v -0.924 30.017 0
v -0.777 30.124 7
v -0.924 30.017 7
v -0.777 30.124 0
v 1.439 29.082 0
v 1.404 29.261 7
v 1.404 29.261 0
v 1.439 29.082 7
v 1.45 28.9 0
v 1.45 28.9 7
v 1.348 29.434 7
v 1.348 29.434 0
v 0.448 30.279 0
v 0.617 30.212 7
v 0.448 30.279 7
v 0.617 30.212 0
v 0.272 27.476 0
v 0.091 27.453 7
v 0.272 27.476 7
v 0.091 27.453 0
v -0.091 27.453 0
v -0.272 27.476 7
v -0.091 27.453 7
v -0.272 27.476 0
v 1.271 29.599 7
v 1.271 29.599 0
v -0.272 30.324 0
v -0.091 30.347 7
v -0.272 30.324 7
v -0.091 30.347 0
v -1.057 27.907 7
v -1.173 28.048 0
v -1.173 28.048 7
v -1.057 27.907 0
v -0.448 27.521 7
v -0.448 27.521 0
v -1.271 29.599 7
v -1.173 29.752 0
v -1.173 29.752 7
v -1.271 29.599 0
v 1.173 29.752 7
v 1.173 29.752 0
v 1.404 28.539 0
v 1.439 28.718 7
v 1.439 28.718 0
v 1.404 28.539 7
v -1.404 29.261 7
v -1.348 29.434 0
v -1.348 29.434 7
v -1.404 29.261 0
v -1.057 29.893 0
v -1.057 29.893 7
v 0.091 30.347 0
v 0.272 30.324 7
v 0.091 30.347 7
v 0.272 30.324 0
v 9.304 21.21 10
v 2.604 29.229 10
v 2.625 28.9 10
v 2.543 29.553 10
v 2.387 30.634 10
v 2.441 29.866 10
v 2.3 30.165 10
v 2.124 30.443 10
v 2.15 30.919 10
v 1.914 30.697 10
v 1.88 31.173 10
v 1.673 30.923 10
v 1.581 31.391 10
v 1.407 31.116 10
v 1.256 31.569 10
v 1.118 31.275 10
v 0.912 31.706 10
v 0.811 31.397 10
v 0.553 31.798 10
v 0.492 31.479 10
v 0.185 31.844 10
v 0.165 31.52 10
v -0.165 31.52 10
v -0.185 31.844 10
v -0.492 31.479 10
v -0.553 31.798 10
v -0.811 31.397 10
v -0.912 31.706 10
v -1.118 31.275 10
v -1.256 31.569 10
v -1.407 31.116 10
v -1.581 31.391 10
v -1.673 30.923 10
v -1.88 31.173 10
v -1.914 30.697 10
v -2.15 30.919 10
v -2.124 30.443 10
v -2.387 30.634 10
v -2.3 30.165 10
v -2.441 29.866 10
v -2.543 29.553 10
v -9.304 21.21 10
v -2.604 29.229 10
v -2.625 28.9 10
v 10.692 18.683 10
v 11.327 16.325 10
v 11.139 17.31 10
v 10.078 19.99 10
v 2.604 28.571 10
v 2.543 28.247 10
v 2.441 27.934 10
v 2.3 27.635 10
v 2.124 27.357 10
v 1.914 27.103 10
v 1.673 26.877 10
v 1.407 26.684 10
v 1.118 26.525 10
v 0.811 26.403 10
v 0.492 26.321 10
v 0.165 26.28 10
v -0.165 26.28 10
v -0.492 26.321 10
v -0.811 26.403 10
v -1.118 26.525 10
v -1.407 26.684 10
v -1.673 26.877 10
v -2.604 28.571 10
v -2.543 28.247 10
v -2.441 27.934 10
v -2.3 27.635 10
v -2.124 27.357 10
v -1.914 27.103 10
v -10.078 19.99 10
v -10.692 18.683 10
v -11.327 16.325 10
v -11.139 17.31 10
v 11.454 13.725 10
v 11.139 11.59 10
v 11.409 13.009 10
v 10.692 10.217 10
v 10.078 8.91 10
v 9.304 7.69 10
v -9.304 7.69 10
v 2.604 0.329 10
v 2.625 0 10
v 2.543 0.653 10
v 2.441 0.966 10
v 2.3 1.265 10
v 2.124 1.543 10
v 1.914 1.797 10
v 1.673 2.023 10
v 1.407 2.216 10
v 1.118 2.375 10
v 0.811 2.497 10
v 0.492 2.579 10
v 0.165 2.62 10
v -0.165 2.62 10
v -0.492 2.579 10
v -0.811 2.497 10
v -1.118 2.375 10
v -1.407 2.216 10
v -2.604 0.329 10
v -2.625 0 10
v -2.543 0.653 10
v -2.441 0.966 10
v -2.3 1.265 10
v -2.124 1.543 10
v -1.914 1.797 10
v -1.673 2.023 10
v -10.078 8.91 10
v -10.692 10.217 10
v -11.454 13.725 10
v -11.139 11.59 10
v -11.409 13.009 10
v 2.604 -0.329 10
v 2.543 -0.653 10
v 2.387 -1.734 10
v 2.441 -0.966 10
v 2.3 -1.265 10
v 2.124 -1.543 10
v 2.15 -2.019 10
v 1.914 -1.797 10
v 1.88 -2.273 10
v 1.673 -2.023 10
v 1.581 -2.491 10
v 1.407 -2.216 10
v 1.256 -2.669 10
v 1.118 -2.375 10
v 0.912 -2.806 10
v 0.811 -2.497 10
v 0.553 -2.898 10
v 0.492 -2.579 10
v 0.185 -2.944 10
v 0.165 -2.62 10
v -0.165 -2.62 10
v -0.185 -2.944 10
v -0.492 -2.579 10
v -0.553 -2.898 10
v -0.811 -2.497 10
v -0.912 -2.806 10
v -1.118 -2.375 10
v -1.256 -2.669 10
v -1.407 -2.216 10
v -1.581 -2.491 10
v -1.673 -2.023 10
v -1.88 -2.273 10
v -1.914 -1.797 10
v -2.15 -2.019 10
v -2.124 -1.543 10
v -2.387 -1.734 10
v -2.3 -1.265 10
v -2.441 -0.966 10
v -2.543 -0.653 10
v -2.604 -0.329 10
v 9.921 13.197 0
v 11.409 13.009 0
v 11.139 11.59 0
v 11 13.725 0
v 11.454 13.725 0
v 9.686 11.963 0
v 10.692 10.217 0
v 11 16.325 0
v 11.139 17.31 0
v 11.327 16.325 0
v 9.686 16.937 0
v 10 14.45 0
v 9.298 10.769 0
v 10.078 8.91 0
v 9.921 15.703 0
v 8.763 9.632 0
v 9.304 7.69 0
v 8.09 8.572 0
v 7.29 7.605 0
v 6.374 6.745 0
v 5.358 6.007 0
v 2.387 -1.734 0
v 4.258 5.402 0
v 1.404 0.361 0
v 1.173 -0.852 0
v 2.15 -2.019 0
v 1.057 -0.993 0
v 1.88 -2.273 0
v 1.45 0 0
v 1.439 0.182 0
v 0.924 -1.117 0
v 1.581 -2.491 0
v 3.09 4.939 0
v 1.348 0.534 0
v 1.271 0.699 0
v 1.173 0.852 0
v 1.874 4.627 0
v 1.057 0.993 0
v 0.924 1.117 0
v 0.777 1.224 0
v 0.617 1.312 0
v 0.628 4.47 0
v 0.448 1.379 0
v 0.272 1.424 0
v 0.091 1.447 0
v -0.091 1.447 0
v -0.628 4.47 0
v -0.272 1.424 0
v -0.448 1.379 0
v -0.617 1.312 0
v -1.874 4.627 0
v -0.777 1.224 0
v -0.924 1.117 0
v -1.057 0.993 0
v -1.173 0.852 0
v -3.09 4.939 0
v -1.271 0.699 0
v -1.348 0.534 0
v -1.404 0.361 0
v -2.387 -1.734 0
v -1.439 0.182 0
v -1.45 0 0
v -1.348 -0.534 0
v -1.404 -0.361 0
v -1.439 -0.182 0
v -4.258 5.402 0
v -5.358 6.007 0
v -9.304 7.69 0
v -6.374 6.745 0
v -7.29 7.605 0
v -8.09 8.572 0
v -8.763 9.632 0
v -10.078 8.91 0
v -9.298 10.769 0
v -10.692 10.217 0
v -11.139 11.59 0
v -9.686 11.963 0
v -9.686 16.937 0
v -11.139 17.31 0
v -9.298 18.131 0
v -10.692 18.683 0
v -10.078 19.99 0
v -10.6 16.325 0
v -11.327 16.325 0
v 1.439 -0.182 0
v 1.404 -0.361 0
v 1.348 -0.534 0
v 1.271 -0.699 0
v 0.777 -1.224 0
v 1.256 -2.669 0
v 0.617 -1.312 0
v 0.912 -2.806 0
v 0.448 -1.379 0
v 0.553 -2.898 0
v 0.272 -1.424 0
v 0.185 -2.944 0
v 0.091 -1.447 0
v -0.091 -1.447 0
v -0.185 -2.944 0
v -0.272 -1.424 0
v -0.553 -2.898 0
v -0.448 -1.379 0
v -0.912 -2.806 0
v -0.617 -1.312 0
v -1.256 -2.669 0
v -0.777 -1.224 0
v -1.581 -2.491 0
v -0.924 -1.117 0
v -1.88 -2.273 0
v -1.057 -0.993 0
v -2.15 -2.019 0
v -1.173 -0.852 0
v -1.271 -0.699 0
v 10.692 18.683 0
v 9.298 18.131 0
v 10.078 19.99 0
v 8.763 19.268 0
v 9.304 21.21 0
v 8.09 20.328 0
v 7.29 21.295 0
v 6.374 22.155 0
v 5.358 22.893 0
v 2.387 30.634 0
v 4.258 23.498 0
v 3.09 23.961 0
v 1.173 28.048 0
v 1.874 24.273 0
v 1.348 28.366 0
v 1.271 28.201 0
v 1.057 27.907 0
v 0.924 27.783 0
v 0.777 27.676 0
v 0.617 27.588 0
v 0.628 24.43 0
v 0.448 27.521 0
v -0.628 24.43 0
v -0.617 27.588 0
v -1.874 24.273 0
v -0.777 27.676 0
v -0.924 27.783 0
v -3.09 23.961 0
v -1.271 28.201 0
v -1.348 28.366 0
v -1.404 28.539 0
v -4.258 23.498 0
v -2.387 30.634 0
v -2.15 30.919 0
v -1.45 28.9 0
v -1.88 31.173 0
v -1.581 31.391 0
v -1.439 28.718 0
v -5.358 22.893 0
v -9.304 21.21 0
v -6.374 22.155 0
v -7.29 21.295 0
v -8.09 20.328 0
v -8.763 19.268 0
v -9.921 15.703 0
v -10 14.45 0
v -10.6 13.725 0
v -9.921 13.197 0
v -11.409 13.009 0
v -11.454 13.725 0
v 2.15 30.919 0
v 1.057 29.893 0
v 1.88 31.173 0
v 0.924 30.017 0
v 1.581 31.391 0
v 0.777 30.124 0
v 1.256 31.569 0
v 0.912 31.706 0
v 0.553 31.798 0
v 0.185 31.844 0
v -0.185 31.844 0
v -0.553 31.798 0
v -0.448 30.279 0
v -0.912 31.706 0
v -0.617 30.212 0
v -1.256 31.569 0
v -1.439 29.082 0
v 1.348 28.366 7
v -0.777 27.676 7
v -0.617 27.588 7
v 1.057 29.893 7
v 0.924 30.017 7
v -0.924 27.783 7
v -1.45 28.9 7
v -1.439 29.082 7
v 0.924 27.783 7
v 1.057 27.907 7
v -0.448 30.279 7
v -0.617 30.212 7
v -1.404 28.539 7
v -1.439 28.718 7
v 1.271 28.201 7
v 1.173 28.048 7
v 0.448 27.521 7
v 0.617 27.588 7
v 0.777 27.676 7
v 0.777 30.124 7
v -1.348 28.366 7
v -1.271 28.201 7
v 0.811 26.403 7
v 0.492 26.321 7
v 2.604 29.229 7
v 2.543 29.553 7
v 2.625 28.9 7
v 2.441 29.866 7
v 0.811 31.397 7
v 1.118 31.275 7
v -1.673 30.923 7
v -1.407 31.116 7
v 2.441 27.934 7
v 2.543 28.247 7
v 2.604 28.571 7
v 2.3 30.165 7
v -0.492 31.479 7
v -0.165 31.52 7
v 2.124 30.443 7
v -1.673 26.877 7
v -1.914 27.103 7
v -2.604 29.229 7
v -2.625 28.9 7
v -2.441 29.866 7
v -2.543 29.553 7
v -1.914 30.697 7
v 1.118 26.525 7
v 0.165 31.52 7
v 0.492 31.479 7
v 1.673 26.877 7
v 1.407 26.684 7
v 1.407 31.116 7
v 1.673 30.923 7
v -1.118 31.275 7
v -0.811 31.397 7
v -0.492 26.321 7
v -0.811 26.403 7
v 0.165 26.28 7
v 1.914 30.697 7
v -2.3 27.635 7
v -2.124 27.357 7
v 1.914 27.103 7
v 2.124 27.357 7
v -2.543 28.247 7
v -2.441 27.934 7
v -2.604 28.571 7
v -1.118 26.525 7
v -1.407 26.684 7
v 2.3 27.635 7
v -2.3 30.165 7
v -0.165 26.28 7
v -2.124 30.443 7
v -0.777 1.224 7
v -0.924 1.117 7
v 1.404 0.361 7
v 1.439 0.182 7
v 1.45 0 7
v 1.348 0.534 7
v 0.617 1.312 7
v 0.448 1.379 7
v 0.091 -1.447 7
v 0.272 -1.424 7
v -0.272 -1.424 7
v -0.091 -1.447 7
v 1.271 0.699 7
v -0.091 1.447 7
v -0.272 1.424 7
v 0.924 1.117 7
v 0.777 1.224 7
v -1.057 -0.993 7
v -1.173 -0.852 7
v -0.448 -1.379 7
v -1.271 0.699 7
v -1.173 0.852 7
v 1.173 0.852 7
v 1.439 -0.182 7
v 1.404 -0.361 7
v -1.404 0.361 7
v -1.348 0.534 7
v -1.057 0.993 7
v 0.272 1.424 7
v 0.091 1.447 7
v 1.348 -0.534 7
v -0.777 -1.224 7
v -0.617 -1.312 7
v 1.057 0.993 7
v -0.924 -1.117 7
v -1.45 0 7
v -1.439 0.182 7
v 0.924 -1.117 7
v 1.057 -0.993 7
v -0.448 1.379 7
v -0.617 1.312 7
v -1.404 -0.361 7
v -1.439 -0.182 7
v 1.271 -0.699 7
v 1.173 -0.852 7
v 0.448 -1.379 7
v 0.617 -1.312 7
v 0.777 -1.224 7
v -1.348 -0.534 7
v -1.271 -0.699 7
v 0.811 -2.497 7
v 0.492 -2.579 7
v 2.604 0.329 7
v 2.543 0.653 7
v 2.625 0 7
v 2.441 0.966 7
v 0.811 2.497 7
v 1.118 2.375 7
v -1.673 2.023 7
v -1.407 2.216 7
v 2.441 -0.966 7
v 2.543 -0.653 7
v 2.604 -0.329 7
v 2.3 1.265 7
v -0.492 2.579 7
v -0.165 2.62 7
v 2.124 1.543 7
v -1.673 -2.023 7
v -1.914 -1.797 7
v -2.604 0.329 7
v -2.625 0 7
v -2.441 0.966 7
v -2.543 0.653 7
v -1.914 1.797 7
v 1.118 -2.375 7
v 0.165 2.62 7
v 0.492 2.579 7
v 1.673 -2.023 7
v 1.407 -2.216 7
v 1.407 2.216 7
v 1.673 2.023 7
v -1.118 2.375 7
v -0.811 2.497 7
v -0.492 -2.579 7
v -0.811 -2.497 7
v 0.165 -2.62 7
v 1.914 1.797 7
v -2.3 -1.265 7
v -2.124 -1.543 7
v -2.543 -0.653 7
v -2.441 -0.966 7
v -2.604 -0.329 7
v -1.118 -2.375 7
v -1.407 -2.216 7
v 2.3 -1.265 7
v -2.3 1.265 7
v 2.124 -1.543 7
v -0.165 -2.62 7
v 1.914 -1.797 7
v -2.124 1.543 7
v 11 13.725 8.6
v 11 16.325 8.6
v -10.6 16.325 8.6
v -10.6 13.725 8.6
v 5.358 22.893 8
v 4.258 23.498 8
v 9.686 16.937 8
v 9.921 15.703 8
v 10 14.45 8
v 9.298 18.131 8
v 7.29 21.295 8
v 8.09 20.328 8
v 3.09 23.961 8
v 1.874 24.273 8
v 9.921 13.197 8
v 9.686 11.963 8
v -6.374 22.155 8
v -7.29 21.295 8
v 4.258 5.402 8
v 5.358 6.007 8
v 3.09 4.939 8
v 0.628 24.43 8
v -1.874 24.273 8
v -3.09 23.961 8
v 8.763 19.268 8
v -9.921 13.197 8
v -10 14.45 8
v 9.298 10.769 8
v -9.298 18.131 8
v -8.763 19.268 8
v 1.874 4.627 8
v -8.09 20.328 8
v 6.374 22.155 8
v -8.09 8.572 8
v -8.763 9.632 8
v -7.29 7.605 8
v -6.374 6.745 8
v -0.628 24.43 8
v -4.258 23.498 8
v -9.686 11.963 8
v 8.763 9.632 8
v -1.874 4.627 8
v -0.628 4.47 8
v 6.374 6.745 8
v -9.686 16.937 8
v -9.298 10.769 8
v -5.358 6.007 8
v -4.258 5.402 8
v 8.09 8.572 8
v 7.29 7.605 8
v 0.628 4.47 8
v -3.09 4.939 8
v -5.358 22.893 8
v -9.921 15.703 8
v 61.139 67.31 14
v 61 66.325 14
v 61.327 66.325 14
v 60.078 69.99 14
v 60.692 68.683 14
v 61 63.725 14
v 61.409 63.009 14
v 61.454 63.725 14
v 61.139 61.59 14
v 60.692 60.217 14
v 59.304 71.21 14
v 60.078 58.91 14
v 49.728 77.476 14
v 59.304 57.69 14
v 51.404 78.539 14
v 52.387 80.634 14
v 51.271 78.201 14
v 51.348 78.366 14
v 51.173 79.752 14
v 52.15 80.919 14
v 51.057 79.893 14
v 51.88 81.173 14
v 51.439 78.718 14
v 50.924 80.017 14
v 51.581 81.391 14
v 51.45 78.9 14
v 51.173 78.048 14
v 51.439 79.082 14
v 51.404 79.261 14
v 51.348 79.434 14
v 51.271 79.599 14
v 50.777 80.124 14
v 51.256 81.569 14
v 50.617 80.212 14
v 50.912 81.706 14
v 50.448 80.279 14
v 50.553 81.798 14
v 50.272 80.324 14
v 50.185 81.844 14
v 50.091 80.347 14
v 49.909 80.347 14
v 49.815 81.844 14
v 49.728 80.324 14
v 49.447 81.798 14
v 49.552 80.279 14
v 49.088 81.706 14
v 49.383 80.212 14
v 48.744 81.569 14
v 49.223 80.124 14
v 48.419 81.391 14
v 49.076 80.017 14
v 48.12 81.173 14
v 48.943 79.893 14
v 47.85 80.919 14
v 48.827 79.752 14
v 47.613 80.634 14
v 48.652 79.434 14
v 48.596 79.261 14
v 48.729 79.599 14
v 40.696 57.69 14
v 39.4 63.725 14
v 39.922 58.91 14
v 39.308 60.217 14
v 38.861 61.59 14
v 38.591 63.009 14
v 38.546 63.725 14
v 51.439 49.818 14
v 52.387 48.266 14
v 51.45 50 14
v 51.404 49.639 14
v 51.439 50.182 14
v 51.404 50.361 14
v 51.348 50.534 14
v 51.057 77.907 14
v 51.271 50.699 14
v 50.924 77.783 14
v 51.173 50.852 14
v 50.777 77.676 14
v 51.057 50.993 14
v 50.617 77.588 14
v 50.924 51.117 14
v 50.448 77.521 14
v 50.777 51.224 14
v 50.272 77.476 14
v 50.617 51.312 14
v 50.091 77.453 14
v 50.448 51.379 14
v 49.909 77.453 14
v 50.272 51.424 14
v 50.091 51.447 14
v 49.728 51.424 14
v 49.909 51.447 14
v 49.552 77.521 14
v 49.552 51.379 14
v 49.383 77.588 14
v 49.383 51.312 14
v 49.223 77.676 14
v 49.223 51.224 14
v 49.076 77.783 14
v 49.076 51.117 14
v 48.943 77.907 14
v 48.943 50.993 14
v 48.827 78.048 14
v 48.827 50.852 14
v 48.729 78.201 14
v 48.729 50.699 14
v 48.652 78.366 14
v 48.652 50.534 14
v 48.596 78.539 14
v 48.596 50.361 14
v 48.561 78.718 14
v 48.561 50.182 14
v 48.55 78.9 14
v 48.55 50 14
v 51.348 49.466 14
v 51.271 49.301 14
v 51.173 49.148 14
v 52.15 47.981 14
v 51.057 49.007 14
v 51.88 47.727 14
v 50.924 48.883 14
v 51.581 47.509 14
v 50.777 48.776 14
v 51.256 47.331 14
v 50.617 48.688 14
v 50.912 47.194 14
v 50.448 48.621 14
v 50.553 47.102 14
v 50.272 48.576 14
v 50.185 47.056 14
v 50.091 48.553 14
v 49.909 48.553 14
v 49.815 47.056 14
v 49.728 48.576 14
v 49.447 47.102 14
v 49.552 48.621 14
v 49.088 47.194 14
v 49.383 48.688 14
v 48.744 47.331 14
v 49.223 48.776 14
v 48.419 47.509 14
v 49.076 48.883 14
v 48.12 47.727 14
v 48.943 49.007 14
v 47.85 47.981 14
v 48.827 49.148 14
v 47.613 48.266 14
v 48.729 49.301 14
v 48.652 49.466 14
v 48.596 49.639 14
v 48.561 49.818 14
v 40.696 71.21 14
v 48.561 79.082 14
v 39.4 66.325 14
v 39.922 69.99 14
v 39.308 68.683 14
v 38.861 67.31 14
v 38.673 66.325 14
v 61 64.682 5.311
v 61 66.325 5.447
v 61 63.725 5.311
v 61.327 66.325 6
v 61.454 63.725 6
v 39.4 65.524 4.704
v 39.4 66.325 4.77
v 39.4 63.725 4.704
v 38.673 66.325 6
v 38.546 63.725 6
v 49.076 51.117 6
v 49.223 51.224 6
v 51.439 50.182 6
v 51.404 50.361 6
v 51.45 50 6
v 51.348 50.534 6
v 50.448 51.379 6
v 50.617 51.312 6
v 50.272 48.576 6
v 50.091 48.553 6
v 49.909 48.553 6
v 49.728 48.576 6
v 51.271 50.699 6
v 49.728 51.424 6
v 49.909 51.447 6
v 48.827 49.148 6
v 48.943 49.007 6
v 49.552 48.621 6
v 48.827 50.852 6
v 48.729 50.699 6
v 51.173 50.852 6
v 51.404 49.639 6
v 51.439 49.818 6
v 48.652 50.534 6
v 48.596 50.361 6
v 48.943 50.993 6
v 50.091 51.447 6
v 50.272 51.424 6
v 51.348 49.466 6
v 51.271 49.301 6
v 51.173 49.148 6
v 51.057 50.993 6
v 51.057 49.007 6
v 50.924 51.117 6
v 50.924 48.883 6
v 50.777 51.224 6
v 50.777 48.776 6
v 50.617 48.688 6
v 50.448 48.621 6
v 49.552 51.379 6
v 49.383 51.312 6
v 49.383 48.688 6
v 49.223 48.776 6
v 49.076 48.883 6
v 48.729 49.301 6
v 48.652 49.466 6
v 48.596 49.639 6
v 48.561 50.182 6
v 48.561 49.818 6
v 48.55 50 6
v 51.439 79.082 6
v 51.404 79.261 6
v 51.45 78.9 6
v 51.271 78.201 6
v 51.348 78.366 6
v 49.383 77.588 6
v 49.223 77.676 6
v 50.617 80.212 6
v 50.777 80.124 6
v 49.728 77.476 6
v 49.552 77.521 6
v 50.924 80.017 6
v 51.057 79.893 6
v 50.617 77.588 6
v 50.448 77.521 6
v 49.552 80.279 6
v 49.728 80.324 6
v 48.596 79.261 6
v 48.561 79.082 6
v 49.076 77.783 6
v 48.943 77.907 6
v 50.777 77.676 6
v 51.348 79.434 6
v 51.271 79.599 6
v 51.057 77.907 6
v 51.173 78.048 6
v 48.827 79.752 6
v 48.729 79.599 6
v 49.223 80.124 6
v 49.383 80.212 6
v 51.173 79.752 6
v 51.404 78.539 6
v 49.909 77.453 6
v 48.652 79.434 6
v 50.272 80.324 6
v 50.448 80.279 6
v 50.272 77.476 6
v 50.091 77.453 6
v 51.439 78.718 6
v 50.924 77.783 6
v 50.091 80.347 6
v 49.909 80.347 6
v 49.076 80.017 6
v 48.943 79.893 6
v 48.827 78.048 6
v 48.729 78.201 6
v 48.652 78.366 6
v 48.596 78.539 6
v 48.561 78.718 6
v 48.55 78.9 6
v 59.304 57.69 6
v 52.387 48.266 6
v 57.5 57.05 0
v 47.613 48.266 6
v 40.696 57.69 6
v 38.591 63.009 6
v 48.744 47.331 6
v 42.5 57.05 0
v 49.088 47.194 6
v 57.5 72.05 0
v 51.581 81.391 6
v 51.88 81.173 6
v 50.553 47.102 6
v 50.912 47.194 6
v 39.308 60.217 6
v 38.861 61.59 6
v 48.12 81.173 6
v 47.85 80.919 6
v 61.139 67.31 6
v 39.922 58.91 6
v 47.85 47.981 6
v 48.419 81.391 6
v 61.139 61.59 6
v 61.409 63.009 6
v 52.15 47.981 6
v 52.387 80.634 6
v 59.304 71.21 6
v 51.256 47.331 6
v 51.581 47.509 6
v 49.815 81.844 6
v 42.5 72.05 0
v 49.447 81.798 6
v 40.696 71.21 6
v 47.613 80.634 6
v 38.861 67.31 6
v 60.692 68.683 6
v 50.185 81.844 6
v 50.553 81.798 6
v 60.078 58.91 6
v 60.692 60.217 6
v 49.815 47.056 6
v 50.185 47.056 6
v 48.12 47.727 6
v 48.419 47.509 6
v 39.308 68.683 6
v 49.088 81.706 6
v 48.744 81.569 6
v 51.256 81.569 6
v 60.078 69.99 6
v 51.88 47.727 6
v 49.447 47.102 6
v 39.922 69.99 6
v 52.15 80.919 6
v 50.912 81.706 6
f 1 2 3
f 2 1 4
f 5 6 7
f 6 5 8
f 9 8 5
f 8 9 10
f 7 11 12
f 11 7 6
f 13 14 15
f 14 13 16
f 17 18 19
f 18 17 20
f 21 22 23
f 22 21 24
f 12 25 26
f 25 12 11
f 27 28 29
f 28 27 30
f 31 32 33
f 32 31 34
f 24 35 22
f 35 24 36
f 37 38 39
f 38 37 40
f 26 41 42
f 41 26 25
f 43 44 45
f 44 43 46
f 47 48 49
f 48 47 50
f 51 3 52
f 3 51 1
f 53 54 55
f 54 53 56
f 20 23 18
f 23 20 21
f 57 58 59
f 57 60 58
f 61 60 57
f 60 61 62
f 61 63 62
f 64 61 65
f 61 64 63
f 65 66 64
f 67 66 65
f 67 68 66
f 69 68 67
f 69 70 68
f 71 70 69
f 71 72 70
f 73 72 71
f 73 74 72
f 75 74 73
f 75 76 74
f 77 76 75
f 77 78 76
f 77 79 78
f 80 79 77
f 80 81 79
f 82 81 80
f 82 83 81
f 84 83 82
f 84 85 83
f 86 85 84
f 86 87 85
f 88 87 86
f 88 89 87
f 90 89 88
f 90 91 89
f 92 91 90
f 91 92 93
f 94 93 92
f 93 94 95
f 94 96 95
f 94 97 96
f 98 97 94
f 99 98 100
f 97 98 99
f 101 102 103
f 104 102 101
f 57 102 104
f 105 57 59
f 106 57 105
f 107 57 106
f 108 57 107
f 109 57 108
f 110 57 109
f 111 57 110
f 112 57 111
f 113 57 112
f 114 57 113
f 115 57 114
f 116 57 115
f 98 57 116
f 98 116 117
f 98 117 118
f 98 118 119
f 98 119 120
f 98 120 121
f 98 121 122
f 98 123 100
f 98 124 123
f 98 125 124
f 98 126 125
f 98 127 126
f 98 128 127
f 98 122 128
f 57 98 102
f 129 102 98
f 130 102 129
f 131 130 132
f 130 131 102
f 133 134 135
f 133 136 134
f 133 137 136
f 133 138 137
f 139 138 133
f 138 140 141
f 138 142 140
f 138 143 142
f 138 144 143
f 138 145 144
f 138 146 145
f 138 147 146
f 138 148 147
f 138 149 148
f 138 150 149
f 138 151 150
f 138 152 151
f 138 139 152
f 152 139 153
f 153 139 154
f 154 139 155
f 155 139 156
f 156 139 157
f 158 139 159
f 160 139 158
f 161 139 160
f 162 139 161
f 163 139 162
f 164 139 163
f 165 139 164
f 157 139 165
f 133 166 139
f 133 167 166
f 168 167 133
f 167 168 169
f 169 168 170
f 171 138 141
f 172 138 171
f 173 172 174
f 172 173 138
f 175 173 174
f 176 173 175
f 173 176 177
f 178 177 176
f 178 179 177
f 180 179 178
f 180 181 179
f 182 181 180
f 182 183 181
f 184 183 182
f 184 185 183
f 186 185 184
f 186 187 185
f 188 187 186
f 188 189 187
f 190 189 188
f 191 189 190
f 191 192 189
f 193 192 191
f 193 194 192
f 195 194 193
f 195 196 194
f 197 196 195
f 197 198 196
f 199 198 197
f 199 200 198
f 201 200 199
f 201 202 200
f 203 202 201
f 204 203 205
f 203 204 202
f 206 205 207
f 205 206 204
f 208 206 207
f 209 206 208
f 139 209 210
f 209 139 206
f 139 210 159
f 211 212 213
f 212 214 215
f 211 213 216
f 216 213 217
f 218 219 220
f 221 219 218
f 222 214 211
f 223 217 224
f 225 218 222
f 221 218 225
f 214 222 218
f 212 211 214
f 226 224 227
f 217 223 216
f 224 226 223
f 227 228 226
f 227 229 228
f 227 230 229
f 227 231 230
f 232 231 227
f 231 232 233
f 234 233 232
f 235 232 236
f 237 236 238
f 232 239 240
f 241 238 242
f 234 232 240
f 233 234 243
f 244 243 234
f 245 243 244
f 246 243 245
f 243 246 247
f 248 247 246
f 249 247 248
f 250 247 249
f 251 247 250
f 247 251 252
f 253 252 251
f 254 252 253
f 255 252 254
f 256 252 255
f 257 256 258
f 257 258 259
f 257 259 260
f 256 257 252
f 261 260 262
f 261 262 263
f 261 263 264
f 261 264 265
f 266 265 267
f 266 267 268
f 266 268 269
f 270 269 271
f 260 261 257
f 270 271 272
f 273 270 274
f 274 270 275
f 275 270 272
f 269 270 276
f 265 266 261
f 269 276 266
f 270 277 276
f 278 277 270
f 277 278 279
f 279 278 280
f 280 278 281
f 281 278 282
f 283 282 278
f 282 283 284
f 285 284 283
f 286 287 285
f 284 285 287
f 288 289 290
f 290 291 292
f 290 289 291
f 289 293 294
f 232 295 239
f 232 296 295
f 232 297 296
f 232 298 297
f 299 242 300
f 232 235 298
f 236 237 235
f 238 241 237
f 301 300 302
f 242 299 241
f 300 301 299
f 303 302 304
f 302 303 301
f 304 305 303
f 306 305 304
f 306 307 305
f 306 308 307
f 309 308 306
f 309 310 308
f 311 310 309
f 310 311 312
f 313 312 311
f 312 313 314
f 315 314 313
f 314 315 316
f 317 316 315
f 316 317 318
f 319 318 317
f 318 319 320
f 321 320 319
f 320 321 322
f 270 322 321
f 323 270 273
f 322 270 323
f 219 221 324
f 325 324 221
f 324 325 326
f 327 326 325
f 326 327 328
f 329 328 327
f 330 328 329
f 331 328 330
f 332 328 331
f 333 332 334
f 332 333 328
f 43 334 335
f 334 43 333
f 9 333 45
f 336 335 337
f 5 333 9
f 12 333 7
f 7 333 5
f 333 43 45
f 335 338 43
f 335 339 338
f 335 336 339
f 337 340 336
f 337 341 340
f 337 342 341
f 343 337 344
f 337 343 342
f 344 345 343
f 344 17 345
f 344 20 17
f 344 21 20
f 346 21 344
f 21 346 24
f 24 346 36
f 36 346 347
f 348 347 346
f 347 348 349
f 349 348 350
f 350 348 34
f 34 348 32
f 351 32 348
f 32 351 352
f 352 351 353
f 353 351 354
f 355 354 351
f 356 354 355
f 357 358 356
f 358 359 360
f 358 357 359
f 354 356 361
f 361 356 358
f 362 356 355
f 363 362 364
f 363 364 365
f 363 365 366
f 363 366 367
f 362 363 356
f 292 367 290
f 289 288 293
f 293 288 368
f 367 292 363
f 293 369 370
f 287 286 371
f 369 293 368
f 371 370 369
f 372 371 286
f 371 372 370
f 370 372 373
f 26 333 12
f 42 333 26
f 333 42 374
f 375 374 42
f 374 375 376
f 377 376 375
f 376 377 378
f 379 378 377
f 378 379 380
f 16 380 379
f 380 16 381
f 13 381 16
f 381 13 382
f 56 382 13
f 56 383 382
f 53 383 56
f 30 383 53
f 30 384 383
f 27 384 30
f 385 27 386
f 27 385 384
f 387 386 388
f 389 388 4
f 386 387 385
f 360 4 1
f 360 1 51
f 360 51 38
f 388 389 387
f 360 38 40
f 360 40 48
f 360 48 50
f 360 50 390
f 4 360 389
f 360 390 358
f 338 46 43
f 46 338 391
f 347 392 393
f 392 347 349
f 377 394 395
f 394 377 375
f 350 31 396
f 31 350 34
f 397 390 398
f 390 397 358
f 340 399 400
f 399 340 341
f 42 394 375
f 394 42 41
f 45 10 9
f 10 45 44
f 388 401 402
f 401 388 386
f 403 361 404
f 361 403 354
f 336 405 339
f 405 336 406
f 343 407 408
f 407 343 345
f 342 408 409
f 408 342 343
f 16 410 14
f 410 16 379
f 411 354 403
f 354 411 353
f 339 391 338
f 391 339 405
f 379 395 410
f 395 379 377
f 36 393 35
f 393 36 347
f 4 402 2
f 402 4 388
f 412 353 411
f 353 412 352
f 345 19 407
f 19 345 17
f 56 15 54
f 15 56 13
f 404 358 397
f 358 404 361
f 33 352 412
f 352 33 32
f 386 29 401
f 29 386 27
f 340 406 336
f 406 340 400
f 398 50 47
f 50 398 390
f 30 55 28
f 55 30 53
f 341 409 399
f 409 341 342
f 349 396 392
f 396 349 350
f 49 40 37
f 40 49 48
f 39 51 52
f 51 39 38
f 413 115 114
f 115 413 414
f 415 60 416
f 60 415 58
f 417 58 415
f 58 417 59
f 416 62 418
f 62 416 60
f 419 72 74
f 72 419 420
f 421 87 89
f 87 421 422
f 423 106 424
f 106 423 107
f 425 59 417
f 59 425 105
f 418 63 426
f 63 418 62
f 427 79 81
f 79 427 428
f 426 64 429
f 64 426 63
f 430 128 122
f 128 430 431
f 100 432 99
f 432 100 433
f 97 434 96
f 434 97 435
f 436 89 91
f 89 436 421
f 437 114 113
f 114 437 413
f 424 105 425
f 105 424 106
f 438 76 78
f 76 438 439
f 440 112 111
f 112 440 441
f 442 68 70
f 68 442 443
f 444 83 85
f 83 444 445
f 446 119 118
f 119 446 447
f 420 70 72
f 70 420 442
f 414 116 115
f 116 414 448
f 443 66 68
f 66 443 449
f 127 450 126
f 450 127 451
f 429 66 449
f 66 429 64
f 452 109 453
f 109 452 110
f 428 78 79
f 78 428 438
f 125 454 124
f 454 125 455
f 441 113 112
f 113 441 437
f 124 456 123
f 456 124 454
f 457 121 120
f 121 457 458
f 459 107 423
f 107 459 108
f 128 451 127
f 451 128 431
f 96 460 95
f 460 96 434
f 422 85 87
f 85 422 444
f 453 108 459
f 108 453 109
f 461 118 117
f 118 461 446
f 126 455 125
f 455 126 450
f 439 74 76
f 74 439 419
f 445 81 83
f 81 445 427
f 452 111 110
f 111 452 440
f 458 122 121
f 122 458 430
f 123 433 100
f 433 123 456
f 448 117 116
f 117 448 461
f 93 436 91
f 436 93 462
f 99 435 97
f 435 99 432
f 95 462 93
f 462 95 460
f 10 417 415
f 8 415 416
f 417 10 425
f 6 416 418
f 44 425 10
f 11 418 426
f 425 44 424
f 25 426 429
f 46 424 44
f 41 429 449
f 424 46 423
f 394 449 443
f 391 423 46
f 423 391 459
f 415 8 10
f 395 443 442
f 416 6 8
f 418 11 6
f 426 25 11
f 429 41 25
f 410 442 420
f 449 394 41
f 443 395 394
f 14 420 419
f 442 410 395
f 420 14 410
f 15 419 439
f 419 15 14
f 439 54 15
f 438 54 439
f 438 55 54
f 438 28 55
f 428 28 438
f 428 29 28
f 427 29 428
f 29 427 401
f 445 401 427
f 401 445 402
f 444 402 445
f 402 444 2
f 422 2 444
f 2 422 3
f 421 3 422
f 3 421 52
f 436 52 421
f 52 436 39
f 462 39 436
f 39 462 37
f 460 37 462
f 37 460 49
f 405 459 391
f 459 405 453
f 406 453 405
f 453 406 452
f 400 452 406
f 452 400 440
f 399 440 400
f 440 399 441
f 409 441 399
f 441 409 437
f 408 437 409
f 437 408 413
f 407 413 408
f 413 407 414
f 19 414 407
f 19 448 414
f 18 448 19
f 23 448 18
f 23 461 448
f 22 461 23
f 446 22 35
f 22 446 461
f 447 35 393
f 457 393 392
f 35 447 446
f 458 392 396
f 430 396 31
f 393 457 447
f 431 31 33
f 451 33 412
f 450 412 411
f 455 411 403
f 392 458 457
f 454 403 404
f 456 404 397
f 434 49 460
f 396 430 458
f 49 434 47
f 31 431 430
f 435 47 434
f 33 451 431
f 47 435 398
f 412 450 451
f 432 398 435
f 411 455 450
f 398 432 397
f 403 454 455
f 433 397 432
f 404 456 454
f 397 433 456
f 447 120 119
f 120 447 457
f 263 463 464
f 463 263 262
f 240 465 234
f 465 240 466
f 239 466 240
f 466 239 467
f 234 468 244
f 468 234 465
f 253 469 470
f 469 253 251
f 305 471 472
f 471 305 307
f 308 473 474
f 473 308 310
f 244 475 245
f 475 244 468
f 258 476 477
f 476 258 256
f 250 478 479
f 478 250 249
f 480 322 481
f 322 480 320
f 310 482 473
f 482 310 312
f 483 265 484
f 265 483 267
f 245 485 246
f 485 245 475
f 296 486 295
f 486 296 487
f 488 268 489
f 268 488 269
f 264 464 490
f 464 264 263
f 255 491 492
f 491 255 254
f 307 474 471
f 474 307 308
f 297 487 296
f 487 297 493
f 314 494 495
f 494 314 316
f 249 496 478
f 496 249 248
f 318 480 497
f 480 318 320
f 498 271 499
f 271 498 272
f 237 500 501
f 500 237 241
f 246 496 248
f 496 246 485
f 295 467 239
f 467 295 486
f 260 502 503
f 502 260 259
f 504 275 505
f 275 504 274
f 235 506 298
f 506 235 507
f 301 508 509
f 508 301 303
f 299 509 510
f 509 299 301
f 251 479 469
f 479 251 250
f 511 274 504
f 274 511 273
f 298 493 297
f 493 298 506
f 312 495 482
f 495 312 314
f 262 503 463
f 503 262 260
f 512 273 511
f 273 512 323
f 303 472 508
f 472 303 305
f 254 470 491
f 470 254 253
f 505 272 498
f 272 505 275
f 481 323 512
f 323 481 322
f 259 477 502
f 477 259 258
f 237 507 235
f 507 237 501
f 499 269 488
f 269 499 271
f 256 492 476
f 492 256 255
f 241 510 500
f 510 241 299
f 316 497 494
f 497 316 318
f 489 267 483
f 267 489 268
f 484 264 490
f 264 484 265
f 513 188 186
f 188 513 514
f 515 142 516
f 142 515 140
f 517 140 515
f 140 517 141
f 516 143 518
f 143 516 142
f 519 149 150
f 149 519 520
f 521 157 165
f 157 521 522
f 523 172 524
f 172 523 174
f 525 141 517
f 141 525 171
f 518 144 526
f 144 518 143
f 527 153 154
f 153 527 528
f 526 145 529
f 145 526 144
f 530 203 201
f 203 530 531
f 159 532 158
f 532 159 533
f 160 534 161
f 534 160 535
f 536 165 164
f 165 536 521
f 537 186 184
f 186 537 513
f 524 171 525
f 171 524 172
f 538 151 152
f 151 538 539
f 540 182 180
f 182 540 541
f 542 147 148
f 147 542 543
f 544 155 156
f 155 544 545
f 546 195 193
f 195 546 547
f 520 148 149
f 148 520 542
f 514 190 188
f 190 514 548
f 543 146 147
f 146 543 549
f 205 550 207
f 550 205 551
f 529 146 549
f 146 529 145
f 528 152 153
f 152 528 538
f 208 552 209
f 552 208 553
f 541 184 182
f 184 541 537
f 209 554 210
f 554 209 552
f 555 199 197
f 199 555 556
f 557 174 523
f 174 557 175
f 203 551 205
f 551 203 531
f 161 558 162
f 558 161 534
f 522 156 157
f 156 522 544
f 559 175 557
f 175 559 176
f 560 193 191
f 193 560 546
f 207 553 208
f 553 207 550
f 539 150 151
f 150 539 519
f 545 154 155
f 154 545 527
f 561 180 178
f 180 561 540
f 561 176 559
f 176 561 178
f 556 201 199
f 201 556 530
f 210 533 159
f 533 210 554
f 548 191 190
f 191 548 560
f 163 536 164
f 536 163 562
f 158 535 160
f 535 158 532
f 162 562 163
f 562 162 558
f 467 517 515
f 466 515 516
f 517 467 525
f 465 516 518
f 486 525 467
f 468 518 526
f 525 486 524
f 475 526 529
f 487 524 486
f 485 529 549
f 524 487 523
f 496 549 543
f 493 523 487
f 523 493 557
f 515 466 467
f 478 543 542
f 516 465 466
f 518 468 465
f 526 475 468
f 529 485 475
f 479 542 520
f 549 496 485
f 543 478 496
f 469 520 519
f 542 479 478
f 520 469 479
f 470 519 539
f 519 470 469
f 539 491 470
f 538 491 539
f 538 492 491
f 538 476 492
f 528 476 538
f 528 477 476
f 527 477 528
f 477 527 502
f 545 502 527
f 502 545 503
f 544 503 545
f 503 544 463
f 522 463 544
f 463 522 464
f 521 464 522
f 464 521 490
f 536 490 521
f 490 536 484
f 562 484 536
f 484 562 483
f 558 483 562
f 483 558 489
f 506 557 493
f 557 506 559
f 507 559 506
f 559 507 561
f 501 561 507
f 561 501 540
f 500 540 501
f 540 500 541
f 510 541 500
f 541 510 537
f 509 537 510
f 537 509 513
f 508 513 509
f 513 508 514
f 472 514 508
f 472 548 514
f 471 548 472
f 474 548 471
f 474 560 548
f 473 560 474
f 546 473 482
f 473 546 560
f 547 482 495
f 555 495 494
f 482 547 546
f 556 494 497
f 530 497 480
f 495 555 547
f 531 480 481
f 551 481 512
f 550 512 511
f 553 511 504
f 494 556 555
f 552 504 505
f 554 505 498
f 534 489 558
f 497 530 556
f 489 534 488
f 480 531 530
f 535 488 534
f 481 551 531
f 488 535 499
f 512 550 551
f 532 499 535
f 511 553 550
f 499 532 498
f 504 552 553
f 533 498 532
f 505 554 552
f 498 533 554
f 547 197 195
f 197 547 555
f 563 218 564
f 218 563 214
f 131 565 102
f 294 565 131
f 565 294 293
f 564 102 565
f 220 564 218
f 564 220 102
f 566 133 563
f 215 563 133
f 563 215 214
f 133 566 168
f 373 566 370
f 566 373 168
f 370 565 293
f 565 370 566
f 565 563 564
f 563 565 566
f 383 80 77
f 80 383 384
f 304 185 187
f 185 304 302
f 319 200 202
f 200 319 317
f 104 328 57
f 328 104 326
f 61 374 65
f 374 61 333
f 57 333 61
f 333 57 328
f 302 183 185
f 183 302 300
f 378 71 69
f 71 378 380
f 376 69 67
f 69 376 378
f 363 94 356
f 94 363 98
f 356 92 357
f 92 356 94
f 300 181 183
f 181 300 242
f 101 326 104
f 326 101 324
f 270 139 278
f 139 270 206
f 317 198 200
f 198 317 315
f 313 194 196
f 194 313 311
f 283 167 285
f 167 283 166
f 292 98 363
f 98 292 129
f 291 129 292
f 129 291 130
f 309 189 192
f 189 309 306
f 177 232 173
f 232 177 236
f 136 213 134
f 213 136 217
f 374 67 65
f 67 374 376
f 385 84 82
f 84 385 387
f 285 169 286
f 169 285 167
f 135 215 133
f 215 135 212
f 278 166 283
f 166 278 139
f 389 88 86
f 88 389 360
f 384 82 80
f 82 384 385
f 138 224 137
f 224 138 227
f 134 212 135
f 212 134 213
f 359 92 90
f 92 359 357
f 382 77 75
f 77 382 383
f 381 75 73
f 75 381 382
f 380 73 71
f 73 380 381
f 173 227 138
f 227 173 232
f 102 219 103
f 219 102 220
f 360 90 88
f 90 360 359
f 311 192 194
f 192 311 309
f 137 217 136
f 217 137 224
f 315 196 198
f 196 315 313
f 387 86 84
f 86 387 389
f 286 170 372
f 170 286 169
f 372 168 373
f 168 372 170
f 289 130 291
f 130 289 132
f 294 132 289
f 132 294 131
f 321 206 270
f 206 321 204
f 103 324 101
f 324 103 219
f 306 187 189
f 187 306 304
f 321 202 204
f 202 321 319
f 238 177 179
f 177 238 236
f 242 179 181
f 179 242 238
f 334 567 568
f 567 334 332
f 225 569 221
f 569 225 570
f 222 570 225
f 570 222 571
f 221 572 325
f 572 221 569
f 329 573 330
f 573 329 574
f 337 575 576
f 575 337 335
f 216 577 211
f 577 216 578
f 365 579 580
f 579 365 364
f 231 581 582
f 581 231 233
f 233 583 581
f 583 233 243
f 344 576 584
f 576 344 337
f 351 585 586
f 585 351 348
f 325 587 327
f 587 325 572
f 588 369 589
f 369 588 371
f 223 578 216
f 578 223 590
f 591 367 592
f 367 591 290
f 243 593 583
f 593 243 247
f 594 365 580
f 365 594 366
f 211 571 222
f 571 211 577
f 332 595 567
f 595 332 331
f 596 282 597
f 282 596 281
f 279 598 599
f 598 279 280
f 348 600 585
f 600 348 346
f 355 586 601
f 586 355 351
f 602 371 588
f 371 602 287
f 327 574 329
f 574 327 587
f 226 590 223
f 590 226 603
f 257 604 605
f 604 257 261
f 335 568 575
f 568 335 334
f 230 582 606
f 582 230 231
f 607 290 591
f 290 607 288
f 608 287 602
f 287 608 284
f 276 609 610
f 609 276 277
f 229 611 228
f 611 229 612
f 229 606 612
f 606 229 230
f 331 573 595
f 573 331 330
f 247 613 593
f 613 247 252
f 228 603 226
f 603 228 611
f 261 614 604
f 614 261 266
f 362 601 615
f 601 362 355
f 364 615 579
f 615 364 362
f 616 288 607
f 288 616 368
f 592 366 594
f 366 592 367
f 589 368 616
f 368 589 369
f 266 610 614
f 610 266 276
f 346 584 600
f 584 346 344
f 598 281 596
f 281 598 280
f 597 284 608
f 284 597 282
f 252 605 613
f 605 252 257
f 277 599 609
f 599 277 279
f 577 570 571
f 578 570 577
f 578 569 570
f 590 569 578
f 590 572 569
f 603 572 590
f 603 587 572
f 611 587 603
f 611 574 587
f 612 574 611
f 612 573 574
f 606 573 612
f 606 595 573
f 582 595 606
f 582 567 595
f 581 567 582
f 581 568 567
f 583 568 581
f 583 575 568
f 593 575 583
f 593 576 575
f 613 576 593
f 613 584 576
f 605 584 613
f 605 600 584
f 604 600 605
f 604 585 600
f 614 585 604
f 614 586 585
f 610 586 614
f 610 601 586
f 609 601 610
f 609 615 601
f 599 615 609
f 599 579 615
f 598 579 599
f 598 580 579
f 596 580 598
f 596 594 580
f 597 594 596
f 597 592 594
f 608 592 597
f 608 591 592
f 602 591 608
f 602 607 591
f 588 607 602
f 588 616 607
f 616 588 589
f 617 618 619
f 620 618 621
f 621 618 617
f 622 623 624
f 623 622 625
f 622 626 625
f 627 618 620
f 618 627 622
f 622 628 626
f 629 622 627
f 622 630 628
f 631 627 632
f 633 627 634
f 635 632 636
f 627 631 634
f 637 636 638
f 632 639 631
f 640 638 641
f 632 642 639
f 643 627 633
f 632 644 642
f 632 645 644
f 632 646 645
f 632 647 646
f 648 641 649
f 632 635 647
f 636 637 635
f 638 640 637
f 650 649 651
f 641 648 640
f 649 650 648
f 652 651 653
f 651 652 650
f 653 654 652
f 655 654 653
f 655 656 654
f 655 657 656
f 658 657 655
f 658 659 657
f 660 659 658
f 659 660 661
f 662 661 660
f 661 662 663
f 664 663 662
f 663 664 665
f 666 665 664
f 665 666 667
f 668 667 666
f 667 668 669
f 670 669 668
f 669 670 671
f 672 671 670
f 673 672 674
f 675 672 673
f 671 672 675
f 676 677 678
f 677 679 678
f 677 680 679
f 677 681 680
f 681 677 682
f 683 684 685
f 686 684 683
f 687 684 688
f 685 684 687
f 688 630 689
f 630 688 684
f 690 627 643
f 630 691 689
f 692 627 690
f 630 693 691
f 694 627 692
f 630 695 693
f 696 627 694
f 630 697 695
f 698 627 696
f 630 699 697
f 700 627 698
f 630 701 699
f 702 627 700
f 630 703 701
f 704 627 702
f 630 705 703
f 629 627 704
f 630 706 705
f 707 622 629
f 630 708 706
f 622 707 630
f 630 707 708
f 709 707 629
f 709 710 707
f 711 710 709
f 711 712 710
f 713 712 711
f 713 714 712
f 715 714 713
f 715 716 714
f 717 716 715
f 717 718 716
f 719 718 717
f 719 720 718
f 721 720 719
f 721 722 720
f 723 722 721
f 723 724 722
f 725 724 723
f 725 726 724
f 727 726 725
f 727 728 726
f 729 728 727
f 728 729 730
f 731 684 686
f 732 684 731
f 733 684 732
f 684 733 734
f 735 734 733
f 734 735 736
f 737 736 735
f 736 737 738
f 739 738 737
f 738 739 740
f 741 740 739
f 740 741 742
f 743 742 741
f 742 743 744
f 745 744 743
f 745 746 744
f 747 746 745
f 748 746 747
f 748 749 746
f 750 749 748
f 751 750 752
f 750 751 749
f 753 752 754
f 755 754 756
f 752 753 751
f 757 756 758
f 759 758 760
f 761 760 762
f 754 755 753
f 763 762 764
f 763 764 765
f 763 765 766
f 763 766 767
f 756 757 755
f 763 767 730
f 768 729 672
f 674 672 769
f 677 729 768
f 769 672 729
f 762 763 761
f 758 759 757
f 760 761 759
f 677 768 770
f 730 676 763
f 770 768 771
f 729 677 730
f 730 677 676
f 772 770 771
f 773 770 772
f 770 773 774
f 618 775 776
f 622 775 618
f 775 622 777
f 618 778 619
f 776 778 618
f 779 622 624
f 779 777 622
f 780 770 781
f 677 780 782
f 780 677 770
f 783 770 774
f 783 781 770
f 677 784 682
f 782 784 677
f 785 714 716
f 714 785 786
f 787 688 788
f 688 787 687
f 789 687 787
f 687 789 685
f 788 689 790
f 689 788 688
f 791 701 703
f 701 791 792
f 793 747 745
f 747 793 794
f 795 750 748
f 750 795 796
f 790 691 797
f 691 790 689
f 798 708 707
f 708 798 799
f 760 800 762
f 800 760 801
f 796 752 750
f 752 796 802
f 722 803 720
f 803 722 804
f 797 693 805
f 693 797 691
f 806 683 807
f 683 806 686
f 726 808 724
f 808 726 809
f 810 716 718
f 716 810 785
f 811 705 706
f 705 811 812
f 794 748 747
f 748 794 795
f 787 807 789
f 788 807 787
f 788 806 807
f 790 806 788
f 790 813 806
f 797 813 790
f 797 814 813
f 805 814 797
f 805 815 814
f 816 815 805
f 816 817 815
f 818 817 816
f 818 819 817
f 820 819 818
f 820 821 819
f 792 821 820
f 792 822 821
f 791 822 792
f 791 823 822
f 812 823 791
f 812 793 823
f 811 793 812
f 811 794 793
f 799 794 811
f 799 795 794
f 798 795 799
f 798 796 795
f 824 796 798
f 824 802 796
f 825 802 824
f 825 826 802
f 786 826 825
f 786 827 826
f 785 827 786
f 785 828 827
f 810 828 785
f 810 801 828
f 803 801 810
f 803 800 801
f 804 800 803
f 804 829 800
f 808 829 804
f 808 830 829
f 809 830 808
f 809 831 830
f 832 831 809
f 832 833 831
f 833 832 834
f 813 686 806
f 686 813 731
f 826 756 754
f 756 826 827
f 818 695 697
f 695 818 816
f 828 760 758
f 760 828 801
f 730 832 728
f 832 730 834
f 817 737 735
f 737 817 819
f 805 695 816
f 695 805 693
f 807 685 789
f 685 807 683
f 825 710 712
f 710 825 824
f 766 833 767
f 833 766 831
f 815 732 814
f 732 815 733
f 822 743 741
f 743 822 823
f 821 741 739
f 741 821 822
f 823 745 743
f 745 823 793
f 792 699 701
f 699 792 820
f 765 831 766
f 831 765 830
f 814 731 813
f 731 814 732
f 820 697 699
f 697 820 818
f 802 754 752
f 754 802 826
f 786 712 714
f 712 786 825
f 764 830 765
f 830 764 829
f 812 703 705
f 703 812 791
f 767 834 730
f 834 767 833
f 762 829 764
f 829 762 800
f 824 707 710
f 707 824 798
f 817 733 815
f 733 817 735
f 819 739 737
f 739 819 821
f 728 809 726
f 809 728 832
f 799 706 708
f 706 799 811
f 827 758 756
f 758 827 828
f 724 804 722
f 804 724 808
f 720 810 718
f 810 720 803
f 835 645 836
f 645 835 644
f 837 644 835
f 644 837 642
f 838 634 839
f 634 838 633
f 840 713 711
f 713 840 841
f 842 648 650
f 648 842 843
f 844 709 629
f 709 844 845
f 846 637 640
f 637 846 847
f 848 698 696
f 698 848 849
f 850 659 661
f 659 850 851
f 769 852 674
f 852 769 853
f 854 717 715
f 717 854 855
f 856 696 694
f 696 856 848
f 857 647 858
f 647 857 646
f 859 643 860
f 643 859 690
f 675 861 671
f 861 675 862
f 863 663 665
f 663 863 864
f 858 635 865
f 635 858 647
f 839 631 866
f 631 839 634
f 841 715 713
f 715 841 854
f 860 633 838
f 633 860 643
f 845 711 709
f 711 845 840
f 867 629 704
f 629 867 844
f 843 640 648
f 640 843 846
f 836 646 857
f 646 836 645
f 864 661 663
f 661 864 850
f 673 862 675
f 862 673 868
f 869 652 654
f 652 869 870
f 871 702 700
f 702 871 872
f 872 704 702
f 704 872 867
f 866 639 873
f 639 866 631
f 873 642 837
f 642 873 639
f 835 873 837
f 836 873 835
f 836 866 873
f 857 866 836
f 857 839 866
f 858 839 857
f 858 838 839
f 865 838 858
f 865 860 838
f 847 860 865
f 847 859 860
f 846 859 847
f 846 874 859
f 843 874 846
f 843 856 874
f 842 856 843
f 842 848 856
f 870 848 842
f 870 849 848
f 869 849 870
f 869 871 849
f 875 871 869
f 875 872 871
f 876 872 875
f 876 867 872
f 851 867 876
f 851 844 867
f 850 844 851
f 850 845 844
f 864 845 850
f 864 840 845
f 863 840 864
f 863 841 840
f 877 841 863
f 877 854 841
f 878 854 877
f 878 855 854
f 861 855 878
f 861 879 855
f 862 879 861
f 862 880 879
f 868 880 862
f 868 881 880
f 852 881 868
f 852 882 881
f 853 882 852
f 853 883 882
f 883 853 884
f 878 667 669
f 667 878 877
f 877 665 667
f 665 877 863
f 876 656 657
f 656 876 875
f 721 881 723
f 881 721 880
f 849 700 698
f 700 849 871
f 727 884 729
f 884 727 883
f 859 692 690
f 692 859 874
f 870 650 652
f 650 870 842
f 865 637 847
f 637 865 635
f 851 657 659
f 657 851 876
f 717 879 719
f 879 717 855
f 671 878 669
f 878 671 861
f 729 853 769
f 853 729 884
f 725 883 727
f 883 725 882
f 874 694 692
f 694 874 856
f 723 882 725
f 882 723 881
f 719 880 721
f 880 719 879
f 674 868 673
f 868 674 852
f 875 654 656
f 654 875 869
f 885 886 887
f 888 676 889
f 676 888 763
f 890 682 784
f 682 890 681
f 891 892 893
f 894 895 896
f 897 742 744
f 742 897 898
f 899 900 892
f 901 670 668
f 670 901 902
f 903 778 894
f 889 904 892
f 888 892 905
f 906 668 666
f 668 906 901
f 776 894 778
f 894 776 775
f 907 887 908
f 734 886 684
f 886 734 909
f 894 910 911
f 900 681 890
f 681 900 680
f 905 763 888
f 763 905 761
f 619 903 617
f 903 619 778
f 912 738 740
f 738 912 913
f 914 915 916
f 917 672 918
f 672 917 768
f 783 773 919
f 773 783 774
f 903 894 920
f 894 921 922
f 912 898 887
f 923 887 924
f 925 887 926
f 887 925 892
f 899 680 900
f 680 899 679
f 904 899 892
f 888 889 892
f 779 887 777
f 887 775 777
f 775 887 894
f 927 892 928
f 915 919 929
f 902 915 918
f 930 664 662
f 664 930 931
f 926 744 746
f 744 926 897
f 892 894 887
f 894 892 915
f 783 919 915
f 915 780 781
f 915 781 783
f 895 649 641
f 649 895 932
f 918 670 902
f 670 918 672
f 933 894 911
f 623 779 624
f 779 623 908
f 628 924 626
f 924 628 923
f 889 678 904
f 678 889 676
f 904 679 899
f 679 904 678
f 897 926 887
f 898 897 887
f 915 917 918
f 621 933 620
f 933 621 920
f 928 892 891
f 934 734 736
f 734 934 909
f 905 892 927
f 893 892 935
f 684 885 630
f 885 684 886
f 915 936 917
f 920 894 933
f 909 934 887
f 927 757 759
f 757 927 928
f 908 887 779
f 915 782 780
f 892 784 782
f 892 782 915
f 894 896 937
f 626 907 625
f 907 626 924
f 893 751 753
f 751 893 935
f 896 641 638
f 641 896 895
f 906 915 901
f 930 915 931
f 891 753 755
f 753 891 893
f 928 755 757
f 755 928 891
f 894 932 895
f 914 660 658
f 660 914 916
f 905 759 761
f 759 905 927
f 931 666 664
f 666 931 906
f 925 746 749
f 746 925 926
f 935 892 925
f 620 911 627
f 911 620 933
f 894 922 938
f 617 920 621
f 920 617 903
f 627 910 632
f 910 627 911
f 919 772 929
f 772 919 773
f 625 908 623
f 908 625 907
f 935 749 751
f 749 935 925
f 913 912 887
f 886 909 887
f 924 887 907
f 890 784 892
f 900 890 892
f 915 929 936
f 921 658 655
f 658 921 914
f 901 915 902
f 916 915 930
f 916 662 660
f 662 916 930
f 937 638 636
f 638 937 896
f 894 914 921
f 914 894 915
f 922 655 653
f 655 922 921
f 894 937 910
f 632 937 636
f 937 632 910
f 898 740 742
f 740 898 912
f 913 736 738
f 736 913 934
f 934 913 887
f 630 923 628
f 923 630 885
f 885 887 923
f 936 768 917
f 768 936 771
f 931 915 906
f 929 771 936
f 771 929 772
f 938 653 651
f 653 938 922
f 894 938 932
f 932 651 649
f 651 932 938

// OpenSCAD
$fn=50;


magnet_height=8;

screw_diameter=2.9;
magnet_diameter=20;
wall_thickness=3;
screw_head_height=3;
screw_head_diameter=5.25;
ziptie_width=2.6;
ziptie_depth=1.4;


screw_head_radius=screw_head_diameter/2;
magnet_radius=magnet_diameter/2;
screw_radius=screw_diameter/2;




module ziptie_side_cutout(top_height, top_cutout=false){
  translate([magnet_radius+wall_thickness-2,magnet_radius+screw_radius/2+wall_thickness,0]){
    cube([ziptie_depth,ziptie_width,top_height]);
    translate([(magnet_diameter+wall_thickness)*-1,0,0])
      cube([ziptie_depth,ziptie_width,top_height]);
    if (top_cutout)
      translate([(magnet_diameter+wall_thickness)*-1,0,top_height-ziptie_depth])
        cube([magnet_diameter+wall_thickness,ziptie_width,top_height]);
  }
}

module screw_cutout(top_height, with_screwheads=false){
    cylinder(h=top_height, r=screw_radius);
    if (with_screwheads)
      translate([0,0,top_height-screw_head_height])
        cylinder(h=screw_head_height, r=screw_head_radius);
    translate([0,magnet_diameter+screw_diameter+wall_thickness*2,0]){
      cylinder(h=top_height, r=screw_radius);
      if (with_screwheads)
        translate([0,0,top_height-screw_head_height])
          cylinder(h=screw_head_height, r=screw_head_radius);
    }
}

module cover_plate(with_magnet=true, with_screwheads=true, with_ziptie=true, top_height=10){
  difference(){
    hull(){
      cylinder(h=top_height, r=screw_radius+wall_thickness/2);
      translate([0,magnet_radius+screw_radius+wall_thickness,0])
        cylinder(h=top_height, r=magnet_radius+wall_thickness/2);
      translate([0,magnet_diameter+screw_diameter+wall_thickness*2,0]){
        cylinder(h=top_height, r=screw_radius+wall_thickness/2);
      }
    }
    screw_cutout(top_height, with_screwheads);
    if (with_magnet)
      translate([0,magnet_radius+screw_radius+wall_thickness,0])
        cylinder(h=magnet_height, r=magnet_radius);
    if (with_ziptie){
      ziptie_side_cutout(top_height, true);
    }
  }
}

cover_plate();

pedal_insert_width=15;
pedal_insert_height=6;
pedal_insert_top_height=8;

translate([50,50,0]){
  difference(){
    hull(){
      // From here...
      translate([pedal_insert_width/2*-1,magnet_radius-screw_radius-wall_thickness/2,0])
        cube([pedal_insert_width, magnet_diameter-5, pedal_insert_height]);
      // .. to here do whatever you need to get it fit your pedal, and has the
      // correct height
      translate([0,0,pedal_insert_height]){
        cover_plate(with_magnet=false, with_screwheads=false, top_height=pedal_insert_top_height);
      }
    }
    ziptie_side_cutout(pedal_insert_top_height+pedal_insert_height);
    translate([0,0,pedal_insert_height]){
      screw_cutout(10, false);
    }
  }
}
